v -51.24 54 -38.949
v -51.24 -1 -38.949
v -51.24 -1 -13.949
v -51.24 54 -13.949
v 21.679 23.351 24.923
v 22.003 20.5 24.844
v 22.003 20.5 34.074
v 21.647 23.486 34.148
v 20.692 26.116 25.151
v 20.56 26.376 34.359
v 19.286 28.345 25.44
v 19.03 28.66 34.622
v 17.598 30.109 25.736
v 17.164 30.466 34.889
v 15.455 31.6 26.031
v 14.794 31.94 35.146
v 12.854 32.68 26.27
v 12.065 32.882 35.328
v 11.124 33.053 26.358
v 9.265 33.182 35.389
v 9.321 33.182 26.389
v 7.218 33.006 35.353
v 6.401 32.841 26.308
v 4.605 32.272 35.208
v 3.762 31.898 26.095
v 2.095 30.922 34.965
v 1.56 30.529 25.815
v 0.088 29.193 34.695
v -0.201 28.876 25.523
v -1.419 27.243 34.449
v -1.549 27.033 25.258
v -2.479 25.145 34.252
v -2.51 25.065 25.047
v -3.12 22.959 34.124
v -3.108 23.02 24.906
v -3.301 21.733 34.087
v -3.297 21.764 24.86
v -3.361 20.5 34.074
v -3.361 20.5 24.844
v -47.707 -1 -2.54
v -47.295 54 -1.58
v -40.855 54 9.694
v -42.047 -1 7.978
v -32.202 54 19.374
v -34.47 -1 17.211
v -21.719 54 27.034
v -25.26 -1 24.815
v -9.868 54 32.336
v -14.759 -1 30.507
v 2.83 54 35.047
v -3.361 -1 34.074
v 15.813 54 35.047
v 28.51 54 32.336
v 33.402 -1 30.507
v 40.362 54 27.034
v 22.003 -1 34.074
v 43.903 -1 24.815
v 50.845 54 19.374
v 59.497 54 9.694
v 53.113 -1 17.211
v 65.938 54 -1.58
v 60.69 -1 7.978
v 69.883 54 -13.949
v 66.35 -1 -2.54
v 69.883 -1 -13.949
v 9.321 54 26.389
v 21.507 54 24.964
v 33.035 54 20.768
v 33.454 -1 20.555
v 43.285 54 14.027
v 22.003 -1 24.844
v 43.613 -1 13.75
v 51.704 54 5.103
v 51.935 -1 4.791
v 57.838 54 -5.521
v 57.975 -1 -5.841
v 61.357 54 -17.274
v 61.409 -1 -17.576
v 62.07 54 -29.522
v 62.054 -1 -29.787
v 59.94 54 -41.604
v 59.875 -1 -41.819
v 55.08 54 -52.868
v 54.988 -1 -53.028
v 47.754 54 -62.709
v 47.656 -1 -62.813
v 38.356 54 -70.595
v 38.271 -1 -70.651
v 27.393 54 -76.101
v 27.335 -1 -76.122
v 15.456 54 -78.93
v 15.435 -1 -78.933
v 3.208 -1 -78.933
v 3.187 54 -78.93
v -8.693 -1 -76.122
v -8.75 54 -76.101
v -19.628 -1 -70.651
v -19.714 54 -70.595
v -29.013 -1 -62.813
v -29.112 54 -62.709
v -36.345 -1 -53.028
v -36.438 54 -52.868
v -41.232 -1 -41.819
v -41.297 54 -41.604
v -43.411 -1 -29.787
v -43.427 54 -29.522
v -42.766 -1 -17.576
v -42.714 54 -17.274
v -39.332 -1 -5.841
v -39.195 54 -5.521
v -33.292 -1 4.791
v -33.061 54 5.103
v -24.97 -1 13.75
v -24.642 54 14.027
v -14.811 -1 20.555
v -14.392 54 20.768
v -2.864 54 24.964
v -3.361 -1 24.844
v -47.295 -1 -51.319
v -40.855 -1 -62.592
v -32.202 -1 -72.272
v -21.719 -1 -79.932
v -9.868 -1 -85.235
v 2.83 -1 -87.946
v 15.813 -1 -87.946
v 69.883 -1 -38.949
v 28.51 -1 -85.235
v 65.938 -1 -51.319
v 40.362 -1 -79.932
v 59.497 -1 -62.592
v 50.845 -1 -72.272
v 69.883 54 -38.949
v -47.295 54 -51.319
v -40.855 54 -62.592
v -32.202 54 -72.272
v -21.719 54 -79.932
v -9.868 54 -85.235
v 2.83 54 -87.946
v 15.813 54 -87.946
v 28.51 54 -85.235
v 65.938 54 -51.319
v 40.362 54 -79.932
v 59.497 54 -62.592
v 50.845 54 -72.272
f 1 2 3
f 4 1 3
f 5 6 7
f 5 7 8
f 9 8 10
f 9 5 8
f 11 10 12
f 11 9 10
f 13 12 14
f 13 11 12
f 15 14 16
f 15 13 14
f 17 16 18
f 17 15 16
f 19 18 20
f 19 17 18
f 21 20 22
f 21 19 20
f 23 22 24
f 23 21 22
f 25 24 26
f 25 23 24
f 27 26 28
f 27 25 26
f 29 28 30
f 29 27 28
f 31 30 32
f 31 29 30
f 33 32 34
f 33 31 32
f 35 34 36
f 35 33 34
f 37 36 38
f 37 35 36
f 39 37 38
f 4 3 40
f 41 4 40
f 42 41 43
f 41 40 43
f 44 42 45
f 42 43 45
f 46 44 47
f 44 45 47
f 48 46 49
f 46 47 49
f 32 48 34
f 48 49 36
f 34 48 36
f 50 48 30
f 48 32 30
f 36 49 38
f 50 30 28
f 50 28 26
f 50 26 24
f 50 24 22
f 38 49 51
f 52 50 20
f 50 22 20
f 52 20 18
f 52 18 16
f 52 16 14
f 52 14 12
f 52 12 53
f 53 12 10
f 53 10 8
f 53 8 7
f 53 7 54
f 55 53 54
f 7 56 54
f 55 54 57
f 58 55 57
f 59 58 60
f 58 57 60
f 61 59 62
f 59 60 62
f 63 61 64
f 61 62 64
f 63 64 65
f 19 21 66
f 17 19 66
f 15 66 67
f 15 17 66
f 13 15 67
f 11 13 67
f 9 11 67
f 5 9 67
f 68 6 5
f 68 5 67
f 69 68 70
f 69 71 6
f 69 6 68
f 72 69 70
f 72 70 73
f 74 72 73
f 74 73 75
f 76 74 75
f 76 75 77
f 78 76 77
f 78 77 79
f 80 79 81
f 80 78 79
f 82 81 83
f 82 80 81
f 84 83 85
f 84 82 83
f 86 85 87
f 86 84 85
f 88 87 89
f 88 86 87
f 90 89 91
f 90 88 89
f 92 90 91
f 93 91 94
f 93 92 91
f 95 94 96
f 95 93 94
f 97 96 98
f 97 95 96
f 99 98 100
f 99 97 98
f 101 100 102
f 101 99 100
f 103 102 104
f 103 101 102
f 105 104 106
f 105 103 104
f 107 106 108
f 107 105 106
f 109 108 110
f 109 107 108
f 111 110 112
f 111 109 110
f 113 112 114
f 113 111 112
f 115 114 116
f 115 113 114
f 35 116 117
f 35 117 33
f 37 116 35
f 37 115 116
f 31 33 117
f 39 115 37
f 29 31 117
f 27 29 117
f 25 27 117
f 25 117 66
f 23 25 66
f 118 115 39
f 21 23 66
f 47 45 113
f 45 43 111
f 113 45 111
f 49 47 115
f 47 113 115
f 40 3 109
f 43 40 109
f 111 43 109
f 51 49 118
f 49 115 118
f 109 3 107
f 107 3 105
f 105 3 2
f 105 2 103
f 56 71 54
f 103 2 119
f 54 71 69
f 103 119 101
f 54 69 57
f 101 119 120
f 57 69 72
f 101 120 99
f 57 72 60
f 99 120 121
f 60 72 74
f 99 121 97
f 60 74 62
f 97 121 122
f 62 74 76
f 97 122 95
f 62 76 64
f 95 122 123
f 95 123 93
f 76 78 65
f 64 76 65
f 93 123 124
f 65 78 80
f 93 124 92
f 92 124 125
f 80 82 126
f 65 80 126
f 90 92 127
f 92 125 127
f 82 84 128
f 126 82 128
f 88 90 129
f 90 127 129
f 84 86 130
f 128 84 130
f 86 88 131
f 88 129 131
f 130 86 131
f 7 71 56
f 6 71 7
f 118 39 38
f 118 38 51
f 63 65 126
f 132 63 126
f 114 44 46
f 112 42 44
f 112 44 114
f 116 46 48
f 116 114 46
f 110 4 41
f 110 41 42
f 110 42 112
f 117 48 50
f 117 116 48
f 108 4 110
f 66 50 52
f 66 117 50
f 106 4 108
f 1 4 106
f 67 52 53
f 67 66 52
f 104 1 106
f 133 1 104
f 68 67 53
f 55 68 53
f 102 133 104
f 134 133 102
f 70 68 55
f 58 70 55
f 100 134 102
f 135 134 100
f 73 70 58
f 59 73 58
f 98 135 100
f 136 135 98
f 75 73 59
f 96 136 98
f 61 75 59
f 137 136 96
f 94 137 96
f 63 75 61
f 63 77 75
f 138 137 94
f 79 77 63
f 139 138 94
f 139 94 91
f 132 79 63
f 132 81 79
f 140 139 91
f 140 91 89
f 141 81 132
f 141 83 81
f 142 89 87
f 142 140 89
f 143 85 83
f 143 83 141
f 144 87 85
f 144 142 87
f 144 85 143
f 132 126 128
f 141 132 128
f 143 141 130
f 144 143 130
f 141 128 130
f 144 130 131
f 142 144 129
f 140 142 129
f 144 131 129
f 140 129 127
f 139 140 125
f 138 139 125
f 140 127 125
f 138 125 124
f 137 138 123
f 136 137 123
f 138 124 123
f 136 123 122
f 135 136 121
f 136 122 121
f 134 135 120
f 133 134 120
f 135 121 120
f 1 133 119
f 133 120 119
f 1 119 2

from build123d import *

# Parameters (mm, degrees)
BOSS_EXTRUDE1_DEPTH      = 54
BOSS_EXTRUDE1_DEPTH_BACK = 1
SKETCH1_R                = 52.838
CUT_EXTRUDE1_DEPTH       = 53


with BuildPart() as part:
    # Sketch1 → Boss-Extrude1 (new, two sides: drawn at the far end of the back side and taken through both)
    with BuildSketch(Plane(origin=(0, 0, 0), x_dir=(1, 0, 0), z_dir=(0, 1, 0)).offset(-BOSS_EXTRUDE1_DEPTH_BACK)):
        with BuildLine():
            Line((-51.240048916, 38.94945257), (-51.240048916, 13.94945257))
            ThreePointArc((-51.240048916, 13.94945257), (9.321392976, -35.38854743), (69.882834868, 13.94945257))
            Line((69.882834868, 13.94945257), (69.882834868, 38.94945257))
            ThreePointArc((69.882834868, 38.94945257), (9.321392976, 88.28745257), (-51.240048916, 38.94945257))
        make_face()
        with Locations(Location((9.321392976, 26.44945257, 0), (0, 0, 270))):
            Circle(SKETCH1_R, mode=Mode.SUBTRACT)
    extrude(amount=BOSS_EXTRUDE1_DEPTH + BOSS_EXTRUDE1_DEPTH_BACK)

    # Sketch2 → Cut-Extrude1 (cut)
    with BuildSketch(Plane.XY):
        with BuildLine():
            Line((-3.360607024, 20.5), (-3.360607024, -1))
            Line((-3.360607024, -1), (22.003392976, -1))
            Line((22.003392976, -1), (22.003392976, 20.5))
            ThreePointArc((22.003392976, 20.5), (9.321392976, 33.182), (-3.360607024, 20.5))
        make_face()
    extrude(amount=CUT_EXTRUDE1_DEPTH, mode=Mode.SUBTRACT)


solid = part.part
